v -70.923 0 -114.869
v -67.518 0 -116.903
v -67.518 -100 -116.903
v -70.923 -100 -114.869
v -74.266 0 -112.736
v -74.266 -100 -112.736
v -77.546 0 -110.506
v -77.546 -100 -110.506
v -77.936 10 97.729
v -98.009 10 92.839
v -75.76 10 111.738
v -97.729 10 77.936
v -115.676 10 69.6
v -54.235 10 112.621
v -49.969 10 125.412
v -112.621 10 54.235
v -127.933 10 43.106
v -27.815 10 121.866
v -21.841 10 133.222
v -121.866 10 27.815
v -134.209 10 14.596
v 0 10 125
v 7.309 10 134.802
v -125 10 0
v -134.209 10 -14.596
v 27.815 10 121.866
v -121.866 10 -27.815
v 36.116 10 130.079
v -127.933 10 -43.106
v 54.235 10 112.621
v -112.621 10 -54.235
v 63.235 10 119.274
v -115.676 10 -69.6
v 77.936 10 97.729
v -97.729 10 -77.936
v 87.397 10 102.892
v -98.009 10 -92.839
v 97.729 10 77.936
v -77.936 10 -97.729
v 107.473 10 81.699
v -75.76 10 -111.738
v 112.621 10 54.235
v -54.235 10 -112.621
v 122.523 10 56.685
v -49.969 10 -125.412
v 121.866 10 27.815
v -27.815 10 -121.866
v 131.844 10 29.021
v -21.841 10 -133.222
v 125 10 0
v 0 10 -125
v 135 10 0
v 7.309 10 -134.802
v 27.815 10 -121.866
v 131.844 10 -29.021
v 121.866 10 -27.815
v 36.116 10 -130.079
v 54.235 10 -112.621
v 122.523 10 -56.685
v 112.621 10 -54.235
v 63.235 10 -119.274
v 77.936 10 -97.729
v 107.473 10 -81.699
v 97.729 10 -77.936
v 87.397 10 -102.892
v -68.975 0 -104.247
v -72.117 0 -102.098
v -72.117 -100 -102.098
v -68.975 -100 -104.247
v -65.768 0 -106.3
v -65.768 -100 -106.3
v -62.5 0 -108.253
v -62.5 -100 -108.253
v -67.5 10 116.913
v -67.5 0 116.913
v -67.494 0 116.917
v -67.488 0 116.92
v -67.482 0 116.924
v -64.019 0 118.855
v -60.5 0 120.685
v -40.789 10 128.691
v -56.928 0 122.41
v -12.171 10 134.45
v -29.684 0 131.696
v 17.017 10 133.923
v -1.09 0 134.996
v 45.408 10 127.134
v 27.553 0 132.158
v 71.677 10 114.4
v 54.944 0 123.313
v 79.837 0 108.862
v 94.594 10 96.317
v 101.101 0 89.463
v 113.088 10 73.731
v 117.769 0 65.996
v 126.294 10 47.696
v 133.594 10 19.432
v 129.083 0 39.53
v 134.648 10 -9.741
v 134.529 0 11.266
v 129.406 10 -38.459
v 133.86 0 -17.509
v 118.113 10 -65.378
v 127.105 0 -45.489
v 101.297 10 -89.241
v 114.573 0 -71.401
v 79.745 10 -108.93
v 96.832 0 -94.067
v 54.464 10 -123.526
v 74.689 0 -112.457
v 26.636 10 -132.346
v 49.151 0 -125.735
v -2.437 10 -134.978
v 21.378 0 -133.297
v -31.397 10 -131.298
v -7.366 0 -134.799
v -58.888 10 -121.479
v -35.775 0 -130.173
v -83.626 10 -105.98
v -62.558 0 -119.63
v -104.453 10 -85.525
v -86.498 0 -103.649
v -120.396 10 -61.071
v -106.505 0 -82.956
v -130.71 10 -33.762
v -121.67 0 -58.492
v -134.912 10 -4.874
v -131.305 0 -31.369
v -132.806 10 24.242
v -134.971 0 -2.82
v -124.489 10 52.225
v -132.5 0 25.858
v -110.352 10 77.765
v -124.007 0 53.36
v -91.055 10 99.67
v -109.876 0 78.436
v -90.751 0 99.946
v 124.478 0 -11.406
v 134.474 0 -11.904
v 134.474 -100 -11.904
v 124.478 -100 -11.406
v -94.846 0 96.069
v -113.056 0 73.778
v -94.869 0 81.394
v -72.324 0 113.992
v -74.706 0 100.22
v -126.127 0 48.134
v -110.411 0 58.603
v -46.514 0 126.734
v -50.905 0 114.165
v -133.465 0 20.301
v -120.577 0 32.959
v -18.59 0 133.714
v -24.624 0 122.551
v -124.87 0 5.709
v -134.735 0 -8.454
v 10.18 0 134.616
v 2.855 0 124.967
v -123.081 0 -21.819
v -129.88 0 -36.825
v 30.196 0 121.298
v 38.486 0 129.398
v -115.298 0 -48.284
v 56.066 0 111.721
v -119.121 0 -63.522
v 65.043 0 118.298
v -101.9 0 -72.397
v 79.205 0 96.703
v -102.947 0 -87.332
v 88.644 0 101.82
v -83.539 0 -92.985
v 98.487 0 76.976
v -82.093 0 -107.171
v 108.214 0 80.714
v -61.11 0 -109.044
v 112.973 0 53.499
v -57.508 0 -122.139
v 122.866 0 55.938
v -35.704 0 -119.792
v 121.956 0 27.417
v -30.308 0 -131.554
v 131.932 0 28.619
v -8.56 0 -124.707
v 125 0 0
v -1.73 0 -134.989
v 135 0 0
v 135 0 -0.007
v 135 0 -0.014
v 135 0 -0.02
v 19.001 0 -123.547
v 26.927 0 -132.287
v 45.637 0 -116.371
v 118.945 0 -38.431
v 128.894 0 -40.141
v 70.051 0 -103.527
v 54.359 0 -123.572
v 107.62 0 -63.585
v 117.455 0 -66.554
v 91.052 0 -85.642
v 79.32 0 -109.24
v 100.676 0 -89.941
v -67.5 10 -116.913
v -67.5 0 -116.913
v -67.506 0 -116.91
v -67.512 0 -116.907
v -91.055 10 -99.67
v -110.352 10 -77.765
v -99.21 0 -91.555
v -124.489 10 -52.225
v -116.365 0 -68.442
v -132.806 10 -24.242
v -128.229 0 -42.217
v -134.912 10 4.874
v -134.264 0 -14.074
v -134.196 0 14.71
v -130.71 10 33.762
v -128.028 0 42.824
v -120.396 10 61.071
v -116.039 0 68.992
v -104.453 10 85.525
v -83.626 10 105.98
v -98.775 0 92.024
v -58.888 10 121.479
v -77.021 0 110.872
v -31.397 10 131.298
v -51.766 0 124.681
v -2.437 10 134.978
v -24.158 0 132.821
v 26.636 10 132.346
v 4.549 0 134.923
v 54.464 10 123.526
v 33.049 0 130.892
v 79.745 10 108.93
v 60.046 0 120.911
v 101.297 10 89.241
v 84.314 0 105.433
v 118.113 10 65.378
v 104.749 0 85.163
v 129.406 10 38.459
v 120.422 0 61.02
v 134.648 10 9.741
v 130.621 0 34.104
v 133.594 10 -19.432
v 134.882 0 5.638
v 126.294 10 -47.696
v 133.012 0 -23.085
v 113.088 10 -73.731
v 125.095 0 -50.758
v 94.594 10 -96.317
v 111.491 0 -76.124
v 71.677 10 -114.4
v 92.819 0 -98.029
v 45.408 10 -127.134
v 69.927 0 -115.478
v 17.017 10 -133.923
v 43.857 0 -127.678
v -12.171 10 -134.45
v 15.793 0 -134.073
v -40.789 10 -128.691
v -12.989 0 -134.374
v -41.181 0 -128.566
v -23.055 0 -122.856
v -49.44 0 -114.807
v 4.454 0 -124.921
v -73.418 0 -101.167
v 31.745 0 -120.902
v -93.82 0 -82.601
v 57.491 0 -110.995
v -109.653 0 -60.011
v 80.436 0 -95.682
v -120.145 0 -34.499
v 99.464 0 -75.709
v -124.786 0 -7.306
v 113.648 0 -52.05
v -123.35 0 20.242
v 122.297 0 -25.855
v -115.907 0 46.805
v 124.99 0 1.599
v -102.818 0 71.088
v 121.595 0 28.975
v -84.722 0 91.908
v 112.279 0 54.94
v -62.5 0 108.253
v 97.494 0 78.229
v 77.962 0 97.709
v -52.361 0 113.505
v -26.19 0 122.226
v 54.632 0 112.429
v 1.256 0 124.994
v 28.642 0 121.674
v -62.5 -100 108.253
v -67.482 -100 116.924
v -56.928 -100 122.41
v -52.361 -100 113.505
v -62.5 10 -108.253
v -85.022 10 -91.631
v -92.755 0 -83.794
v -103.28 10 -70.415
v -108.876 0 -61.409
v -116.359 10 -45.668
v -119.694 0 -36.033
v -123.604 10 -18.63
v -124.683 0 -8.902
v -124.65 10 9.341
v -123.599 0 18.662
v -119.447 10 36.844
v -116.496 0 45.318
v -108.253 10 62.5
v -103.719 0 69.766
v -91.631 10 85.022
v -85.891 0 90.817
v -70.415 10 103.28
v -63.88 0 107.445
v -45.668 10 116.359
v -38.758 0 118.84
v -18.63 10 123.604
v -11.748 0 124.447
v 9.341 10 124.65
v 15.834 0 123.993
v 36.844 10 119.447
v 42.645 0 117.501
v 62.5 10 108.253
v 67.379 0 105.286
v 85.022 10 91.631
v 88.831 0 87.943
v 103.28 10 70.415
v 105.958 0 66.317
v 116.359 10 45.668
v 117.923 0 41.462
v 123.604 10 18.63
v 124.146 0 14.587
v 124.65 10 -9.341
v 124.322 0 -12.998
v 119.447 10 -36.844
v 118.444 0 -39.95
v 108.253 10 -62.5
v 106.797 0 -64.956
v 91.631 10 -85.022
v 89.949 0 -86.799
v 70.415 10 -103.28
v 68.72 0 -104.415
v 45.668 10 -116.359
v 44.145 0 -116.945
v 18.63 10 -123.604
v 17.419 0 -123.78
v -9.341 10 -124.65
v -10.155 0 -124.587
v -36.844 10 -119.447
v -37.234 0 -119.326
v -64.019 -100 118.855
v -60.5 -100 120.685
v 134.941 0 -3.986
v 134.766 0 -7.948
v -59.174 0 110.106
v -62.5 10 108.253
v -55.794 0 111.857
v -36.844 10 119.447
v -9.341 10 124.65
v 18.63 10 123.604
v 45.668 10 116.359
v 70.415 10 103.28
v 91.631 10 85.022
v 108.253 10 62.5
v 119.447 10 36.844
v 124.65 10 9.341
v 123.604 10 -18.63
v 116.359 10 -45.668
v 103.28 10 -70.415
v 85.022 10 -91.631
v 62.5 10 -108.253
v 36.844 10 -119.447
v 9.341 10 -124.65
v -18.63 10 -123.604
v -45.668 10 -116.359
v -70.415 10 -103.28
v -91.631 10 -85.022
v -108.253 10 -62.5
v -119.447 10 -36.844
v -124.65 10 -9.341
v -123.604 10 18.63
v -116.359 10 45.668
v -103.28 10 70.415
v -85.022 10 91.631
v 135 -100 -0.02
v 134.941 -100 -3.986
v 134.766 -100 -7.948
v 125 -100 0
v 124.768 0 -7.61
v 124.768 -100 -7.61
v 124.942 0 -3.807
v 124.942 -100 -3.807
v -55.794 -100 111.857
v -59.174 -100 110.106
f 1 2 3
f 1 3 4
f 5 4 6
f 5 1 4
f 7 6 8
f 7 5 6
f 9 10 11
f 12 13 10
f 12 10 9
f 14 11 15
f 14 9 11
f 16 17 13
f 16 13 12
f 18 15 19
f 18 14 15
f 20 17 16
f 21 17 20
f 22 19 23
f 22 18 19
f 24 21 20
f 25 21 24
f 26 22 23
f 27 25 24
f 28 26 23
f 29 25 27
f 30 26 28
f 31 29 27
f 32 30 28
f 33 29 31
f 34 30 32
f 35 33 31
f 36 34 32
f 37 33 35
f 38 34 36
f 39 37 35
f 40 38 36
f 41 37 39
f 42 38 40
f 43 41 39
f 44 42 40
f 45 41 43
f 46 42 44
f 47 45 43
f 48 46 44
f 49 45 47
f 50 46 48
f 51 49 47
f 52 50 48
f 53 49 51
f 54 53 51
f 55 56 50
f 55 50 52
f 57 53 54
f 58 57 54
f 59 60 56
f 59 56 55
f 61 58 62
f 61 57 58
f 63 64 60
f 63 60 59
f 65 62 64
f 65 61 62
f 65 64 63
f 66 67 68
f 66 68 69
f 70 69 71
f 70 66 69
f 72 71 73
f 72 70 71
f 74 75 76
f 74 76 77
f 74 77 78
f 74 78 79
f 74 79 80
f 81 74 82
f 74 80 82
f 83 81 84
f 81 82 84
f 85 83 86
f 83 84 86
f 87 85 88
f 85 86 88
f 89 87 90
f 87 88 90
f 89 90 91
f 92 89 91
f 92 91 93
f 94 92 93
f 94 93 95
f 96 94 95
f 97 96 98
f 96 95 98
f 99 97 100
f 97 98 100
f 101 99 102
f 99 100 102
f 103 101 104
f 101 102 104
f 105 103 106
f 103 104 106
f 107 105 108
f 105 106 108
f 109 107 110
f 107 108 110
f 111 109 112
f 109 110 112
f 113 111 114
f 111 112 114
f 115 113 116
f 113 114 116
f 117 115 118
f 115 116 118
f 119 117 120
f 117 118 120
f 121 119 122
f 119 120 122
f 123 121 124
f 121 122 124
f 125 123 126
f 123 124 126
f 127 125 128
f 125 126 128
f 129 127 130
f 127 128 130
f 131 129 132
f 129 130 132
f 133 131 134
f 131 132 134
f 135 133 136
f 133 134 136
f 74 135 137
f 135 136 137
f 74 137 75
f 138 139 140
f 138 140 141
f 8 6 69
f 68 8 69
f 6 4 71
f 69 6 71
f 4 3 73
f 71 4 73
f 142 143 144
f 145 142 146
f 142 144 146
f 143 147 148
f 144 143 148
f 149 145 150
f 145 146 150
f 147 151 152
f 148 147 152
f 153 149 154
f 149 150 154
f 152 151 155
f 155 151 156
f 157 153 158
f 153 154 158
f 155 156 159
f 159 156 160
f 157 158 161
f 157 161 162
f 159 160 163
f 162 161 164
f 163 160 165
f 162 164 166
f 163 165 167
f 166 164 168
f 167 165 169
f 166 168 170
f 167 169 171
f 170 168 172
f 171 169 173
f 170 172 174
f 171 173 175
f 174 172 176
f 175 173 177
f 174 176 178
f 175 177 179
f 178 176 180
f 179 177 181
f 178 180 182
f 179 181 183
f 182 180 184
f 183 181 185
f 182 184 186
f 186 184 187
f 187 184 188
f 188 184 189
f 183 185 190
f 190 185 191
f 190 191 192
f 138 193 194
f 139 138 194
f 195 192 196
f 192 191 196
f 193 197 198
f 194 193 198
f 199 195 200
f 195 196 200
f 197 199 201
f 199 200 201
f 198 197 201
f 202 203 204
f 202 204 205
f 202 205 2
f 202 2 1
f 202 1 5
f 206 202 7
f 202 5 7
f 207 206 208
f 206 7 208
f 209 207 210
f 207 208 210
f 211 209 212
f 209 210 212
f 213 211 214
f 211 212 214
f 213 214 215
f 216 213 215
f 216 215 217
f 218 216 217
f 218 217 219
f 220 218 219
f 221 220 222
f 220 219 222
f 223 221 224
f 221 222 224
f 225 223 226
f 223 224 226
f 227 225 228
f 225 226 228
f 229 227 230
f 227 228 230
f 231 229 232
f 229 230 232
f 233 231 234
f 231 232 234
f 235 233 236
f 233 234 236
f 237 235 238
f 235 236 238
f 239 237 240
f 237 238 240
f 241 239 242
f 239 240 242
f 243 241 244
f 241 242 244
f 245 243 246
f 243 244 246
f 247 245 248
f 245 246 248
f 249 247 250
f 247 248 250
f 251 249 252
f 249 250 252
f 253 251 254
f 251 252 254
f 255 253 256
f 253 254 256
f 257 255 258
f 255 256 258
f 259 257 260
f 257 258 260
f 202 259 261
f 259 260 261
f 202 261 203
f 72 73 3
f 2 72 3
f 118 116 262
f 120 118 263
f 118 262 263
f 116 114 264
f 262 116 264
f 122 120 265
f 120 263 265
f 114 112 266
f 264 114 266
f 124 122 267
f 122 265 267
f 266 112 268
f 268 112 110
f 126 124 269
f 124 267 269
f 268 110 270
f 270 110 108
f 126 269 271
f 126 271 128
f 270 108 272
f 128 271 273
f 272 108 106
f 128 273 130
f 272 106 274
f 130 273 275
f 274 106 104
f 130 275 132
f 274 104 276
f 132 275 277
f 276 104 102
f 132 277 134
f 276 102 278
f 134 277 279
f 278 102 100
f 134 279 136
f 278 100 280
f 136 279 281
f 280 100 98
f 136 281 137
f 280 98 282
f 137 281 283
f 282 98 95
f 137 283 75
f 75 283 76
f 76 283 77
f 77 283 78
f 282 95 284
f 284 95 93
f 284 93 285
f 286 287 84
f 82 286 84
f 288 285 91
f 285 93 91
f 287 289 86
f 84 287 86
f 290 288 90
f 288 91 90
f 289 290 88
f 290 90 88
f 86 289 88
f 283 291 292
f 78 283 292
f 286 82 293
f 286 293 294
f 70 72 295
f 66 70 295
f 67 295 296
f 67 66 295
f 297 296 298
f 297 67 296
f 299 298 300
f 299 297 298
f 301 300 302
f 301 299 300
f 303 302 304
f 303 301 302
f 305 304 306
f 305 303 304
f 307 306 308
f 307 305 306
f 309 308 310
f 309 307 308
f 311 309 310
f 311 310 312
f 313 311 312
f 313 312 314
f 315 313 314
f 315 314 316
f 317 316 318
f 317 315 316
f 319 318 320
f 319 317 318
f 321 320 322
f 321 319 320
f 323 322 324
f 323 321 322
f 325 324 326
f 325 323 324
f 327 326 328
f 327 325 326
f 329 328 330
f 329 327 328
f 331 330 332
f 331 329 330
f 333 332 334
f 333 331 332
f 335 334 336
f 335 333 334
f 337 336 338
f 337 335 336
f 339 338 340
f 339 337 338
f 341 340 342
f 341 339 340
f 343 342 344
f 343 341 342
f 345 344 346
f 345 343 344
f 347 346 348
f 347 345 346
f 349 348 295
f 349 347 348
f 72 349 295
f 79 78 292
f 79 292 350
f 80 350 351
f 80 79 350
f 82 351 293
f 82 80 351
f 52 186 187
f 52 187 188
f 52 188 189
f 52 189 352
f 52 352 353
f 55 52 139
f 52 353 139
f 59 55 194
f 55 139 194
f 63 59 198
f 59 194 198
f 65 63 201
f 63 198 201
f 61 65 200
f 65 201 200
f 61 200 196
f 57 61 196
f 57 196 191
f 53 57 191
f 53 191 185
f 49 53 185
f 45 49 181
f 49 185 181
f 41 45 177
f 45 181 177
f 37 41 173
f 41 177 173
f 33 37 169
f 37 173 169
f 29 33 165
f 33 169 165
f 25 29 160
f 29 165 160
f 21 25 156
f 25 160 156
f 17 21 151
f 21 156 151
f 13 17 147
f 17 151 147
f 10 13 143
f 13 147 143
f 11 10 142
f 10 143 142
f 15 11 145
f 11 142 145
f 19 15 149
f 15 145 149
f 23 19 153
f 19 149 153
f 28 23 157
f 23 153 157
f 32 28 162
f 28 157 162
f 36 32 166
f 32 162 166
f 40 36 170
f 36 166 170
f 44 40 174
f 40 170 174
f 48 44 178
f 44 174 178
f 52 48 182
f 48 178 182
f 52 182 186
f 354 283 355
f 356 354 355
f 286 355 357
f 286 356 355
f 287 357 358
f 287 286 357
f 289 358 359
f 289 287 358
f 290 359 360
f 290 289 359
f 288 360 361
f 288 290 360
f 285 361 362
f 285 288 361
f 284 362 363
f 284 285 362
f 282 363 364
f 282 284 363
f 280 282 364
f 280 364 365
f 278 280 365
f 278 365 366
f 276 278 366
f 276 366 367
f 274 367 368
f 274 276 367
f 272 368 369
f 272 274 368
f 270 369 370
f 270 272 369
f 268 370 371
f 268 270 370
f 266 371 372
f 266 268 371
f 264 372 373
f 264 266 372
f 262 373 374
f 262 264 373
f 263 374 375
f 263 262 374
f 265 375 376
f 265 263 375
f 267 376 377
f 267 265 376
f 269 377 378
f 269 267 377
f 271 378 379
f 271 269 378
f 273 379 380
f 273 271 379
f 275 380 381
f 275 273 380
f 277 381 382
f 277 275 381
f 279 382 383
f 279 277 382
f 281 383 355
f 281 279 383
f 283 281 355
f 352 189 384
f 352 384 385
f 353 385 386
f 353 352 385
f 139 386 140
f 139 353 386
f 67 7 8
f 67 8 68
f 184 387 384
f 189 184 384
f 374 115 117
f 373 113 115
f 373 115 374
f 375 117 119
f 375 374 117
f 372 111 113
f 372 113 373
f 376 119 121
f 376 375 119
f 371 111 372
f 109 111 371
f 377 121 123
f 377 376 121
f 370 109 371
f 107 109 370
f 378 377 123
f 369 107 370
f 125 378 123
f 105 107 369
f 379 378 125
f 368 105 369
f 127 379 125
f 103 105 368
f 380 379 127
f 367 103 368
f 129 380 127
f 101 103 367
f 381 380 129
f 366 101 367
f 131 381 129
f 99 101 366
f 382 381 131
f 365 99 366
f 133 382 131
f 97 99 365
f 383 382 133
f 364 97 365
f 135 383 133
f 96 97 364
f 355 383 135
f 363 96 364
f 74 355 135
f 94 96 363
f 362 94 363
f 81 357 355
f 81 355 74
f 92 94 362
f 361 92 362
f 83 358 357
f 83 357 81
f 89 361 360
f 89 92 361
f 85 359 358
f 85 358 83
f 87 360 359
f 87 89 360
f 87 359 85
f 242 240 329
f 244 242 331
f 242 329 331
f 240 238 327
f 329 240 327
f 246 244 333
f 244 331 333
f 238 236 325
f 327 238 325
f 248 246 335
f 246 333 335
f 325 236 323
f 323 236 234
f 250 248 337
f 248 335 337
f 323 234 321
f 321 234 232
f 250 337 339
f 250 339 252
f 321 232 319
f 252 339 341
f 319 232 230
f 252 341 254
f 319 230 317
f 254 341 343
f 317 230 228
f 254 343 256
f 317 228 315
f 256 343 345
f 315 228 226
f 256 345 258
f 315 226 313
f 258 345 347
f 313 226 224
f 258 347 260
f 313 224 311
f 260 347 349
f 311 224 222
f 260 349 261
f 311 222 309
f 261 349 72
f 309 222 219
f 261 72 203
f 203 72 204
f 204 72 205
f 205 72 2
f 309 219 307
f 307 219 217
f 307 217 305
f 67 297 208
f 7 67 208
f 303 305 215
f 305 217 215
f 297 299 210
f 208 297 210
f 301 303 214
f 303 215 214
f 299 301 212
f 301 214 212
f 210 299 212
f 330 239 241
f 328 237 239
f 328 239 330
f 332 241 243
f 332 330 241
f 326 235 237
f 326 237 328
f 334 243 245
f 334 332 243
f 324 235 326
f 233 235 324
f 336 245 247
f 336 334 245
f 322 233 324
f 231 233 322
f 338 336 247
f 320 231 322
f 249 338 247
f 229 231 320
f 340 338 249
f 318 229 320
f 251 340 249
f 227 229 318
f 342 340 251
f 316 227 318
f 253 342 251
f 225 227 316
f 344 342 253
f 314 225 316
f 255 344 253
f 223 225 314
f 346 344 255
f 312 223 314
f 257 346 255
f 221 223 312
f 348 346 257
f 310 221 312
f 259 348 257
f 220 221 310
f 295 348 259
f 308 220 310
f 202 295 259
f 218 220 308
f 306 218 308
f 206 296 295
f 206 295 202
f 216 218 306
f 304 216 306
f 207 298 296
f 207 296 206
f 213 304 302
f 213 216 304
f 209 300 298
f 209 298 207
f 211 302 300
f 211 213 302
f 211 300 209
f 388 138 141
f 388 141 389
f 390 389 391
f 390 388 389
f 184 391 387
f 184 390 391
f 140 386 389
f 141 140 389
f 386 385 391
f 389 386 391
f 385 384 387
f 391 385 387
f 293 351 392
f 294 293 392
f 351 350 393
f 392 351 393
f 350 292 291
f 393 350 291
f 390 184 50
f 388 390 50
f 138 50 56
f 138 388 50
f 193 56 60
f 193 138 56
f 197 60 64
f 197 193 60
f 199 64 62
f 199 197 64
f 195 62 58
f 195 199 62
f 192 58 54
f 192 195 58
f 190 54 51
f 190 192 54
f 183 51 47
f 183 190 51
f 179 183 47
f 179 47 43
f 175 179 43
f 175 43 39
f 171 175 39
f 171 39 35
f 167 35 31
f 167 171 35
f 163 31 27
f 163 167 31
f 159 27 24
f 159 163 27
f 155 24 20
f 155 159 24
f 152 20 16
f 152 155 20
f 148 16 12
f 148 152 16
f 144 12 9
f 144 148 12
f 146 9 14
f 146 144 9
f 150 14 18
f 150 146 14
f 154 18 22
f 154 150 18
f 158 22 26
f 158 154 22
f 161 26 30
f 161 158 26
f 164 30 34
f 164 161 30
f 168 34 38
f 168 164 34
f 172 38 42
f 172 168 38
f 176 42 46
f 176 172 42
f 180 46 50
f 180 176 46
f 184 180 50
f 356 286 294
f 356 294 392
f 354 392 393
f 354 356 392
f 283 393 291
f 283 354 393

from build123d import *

# Parameters (mm, degrees)
SKETCH2_R           = 135
SKETCH2_R_2         = 125
BOSS_EXTRUDE1_DEPTH = 10
BOSS_EXTRUDE2_DEPTH = 100
CIRPATTERN1_COUNT   = 3


with BuildPart() as part:
    # Sketch2 → Boss-Extrude1 (new body)
    with BuildSketch(Plane(origin=(0, 0, 0), x_dir=(1, 0, 0), z_dir=(0, 1, 0))):
        Circle(SKETCH2_R)
        Circle(SKETCH2_R_2, mode=Mode.SUBTRACT)
    extrude(amount=BOSS_EXTRUDE1_DEPTH)

    # Sketch4 → Boss-Extrude2 (add)
    with BuildSketch(Plane.XZ):
        with BuildLine():
            Line((125, 0), (134.999998466, -0.020349279))
            ThreePointArc((134.999998466, -0.020349279), (134.868029655, -5.967794984), (134.474172467, -11.903652353))
            Line((134.474172467, -11.903652353), (124.478495141, -11.406324891))
            ThreePointArc((124.478495141, -11.406324891), (124.869555722, -5.709120222), (125, 0))
        make_face()
    extrude(amount=BOSS_EXTRUDE2_DEPTH)


with BuildPart() as cirpattern1_1:
    # CirPattern1: pattern copy
    add(part.part.rotate(Axis((0, 0, 0), (0, 1, 0)), 1 * 360 / CIRPATTERN1_COUNT))


with BuildPart() as cirpattern1_2:
    # CirPattern1: pattern copy
    add(part.part.rotate(Axis((0, 0, 0), (0, 1, 0)), 2 * 360 / CIRPATTERN1_COUNT))


solid = Compound([part.part, cirpattern1_1.part, cirpattern1_2.part])
